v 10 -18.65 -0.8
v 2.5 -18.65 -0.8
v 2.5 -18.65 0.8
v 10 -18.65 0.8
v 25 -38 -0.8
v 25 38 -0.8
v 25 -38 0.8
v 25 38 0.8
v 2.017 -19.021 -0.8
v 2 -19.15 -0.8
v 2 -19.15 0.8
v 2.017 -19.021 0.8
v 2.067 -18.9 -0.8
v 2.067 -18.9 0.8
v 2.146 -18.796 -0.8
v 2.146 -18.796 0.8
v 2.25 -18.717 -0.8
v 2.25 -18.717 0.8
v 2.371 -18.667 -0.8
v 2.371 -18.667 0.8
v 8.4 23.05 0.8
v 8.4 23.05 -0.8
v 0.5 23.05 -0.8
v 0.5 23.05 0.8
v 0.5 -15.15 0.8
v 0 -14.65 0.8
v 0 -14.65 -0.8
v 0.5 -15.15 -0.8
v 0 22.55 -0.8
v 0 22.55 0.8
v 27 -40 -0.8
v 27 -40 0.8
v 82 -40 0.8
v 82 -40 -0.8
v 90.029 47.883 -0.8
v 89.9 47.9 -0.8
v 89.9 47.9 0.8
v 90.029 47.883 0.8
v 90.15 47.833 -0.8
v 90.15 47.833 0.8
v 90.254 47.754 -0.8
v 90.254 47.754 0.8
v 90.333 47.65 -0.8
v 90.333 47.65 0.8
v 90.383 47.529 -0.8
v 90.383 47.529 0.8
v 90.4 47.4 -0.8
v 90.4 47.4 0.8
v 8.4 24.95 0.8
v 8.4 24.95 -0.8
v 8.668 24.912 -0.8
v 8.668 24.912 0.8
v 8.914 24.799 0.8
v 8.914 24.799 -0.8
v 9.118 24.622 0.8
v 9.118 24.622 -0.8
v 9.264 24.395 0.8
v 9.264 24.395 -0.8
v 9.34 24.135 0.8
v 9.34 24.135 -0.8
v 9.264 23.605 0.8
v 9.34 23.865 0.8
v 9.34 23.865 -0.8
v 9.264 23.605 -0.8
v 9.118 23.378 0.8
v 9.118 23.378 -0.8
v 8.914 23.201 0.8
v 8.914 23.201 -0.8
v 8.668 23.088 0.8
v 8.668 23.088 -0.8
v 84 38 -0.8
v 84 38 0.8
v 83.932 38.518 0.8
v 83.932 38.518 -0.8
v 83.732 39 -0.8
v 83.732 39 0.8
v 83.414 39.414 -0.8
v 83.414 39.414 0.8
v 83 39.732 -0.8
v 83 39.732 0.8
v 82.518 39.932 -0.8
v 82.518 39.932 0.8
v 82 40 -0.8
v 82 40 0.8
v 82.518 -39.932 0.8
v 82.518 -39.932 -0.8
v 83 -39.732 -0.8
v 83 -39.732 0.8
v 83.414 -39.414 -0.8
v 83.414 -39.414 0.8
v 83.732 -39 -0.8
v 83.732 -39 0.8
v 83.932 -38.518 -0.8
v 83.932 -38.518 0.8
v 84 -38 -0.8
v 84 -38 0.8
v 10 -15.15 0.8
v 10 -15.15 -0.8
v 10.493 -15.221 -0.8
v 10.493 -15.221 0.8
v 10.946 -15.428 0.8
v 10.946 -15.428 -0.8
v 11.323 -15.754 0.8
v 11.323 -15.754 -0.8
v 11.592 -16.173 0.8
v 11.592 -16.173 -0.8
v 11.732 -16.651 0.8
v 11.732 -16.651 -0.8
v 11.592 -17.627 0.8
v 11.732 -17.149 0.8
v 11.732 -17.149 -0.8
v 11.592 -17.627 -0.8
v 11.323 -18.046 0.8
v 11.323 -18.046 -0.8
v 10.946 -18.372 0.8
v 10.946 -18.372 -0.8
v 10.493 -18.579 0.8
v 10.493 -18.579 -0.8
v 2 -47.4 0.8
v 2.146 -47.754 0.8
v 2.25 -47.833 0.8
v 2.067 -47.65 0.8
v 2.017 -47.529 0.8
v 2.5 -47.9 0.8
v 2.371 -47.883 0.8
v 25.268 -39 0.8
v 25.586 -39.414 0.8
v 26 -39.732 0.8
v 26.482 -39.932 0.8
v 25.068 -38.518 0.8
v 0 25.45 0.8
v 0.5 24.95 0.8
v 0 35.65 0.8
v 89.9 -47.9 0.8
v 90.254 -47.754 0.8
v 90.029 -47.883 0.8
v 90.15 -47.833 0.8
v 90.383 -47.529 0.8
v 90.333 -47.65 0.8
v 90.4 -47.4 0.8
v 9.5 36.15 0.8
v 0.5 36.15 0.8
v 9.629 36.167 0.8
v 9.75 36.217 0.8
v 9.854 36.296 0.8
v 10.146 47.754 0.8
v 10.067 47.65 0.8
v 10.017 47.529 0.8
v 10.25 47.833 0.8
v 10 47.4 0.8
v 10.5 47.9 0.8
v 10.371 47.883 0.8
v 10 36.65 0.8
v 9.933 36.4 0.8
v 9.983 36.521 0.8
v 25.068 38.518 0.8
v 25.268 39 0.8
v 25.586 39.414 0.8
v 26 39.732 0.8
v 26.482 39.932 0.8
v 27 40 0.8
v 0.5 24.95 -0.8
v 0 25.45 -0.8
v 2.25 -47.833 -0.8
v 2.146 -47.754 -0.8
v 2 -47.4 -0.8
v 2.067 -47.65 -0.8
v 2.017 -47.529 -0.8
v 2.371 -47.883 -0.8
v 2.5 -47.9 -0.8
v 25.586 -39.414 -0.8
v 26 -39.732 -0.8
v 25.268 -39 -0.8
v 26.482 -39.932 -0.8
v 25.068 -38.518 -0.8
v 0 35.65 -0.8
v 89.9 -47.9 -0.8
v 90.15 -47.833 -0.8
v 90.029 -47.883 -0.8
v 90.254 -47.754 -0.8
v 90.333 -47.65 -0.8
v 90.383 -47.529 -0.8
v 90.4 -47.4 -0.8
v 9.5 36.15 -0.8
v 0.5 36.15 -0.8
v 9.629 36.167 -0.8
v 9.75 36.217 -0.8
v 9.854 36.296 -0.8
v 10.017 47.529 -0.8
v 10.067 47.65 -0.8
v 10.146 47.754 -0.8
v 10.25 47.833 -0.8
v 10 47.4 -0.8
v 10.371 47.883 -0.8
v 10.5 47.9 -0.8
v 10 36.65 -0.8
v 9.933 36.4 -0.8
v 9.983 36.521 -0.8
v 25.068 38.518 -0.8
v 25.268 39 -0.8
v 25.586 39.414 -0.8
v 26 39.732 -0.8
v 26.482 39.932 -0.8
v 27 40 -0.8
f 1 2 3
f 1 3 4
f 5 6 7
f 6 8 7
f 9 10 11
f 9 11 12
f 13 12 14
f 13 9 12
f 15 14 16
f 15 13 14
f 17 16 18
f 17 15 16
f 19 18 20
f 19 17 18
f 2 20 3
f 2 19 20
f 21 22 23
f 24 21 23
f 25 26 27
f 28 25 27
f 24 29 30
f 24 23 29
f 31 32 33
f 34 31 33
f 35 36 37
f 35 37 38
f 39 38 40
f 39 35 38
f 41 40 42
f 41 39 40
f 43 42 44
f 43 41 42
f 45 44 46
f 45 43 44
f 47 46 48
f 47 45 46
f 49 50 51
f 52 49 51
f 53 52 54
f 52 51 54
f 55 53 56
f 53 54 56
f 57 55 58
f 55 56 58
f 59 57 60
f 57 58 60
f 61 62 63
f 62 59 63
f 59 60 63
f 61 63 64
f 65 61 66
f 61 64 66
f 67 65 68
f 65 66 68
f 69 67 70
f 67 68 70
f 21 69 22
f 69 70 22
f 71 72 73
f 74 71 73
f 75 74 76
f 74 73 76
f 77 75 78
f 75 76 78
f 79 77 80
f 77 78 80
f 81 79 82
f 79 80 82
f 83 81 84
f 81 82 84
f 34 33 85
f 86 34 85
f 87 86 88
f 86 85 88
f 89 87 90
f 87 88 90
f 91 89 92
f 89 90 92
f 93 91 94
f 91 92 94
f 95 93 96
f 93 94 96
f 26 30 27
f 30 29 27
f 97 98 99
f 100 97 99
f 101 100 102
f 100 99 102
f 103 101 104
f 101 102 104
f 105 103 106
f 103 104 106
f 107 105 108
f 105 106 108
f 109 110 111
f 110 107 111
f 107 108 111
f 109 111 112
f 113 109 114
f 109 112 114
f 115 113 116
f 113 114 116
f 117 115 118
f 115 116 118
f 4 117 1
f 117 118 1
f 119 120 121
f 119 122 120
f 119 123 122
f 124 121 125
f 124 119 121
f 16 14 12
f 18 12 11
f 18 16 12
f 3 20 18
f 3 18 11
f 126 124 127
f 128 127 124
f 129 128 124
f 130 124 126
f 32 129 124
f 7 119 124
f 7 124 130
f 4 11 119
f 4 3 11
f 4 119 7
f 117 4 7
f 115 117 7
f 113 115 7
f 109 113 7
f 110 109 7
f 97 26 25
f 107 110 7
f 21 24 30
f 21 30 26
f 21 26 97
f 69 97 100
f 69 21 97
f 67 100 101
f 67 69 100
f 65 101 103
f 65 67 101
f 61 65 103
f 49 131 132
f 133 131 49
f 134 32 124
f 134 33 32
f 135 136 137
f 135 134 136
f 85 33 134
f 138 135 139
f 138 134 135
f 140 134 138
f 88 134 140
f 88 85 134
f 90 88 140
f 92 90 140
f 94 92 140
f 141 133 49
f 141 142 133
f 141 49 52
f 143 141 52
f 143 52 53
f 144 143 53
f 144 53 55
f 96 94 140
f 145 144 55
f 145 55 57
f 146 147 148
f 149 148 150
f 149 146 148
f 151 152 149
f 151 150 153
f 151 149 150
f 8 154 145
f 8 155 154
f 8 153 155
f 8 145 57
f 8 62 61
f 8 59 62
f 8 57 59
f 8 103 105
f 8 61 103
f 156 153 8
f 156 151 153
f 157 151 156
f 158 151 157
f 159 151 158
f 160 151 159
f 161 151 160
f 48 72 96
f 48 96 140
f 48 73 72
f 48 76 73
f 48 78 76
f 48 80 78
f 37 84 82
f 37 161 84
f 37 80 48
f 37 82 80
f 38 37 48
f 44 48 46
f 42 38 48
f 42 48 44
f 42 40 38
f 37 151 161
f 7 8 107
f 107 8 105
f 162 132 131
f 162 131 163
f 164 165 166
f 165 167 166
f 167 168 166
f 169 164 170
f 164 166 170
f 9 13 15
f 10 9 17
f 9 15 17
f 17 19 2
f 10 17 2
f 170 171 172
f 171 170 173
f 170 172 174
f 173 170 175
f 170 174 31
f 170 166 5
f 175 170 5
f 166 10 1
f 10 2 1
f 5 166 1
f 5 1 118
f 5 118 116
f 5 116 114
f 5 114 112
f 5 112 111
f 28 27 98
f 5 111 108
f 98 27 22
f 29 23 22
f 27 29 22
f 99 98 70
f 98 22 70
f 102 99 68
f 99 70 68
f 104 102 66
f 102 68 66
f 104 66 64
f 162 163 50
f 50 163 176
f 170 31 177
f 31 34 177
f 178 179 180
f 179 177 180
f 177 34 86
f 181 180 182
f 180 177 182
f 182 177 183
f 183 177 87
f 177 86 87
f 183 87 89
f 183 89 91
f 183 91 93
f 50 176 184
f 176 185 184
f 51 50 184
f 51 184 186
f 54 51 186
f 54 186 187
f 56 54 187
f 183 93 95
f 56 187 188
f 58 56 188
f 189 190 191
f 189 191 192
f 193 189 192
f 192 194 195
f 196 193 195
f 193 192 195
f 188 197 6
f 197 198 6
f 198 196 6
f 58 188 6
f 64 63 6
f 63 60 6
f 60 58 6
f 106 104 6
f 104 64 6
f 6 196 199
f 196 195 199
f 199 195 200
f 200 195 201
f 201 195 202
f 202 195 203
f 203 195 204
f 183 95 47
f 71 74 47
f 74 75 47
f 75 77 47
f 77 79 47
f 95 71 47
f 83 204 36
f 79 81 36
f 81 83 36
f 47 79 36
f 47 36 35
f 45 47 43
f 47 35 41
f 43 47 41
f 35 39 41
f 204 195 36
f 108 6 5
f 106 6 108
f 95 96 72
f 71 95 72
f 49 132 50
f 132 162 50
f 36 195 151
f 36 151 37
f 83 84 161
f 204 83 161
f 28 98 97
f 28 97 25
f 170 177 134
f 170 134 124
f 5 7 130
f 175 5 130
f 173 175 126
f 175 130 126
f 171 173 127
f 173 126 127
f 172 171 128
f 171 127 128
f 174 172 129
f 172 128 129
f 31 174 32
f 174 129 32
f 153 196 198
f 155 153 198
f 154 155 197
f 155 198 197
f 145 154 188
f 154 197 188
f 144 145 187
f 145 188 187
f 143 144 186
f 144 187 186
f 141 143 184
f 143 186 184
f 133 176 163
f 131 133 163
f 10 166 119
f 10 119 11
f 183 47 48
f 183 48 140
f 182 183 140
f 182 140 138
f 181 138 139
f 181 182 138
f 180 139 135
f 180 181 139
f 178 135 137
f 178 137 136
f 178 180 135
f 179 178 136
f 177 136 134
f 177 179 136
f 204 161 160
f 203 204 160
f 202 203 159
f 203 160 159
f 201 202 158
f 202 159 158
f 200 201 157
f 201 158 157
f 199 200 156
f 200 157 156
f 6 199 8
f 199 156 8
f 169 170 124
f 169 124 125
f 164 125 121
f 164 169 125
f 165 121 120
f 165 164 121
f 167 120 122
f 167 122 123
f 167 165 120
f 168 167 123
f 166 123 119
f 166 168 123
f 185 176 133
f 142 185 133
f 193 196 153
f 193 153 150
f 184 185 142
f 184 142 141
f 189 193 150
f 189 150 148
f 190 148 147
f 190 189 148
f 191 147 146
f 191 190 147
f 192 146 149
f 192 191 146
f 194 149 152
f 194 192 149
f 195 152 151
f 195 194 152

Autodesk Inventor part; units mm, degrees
ref_plane "YZ Plane" through (0, 0, 0) normal (1, 0, 0) x (0, 1, 0)
ref_plane "XZ Plane" through (0, 0, 0) normal (0, 1, 0) x (-1, 0, 0)
ref_plane "XY Plane" through (0, 0, 0) normal (0, 0, 1) x (1, 0, 0)
sketch "Sketch1" plane through (0, 0, 0) normal (0, 0, 1) x (1, 0, 0)
  line L0 (0, 36.15) -> (10, 36.15)
  line L1 (10, 36.15) -> (10, 47.9)
  line L2 (10, 47.9) -> (90.4, 47.9)
  line L3 (90.4, 47.9) -> (90.4, -47.9)
  line L4 (90.4, -47.9) -> (2, -47.9)
  line L5 (10, -15.15) -> (0, -15.15)
  line L6 (-5.5, 48) -> (90.5, 48) construction
  line L7 (90.5, 48) -> (90.5, -48) construction
  line L8 (90.5, -48) -> (-5.5, -48) construction
  line L9 (-5.5, -48) -> (-5.5, 48) construction
  line L10 (-5.4, 47.9) -> (-3.4, 47.9) construction
  line L11 (-3.4, 47.9) -> (-3.4, -47.9) construction
  line L12 (-3.4, -47.9) -> (-5.4, -47.9) construction
  line L13 (-5.4, -47.9) -> (-5.4, 47.9) construction
  line L14 (-3.4, 38.5) -> (7.85, 38.5) construction
  line L15 (7.85, 38.5) -> (7.85, -17.5) construction
  line L16 (7.85, -17.5) -> (-3.4, -17.5) construction
  line L17 (-3.4, -17.5) -> (-3.4, 38.5) construction
  line L18 (2, -47.9) -> (2, -18.65)
  line L19 (2, -18.65) -> (10, -18.65)
  arc A0 (10, -18.65) -> (10, -15.15) centre (10, -16.9) ccw
  line L20 (0, 24) -> (90.5, 24) construction
  circle A1 centre (-2.5, 47.1) radius 0.9 construction
  circle A2 centre (-0.7, 47.1) radius 0.9 construction
  circle A3 centre (1.1, 47.1) radius 0.9 construction
  circle A4 centre (2.9, 47.1) radius 0.9 construction
  circle A5 centre (4.7, 47.1) radius 0.9 construction
  circle A6 centre (6.5, 47.1) radius 0.9 construction
  circle A7 centre (8.3, 47.1) radius 0.9 construction
  circle A8 centre (-2.5, 45.3) radius 0.9 construction
  circle A9 centre (-0.7, 45.3) radius 0.9 construction
  circle A10 centre (1.1, 45.3) radius 0.9 construction
  circle A11 centre (2.9, 45.3) radius 0.9 construction
  circle A12 centre (4.7, 45.3) radius 0.9 construction
  circle A13 centre (6.5, 45.3) radius 0.9 construction
  circle A14 centre (8.3, 45.3) radius 0.9 construction
  circle A15 centre (-2.5, 43.5) radius 0.9 construction
  circle A16 centre (-0.7, 43.5) radius 0.9 construction
  circle A17 centre (1.1, 43.5) radius 0.9 construction
  circle A18 centre (2.9, 43.5) radius 0.9 construction
  circle A19 centre (4.7, 43.5) radius 0.9 construction
  circle A20 centre (6.5, 43.5) radius 0.9 construction
  circle A21 centre (8.3, 43.5) radius 0.9 construction
  circle A22 centre (-2.5, 41.7) radius 0.9 construction
  circle A23 centre (-0.7, 41.7) radius 0.9 construction
  circle A24 centre (1.1, 41.7) radius 0.9 construction
  circle A25 centre (2.9, 41.7) radius 0.9 construction
  circle A26 centre (4.7, 41.7) radius 0.9 construction
  circle A27 centre (6.5, 41.7) radius 0.9 construction
  circle A28 centre (8.3, 41.7) radius 0.9 construction
  circle A29 centre (-2.5, 39.9) radius 0.9 construction
  circle A30 centre (-0.7, 39.9) radius 0.9 construction
  circle A31 centre (1.1, 39.9) radius 0.9 construction
  circle A32 centre (2.9, 39.9) radius 0.9 construction
  circle A33 centre (4.7, 39.9) radius 0.9 construction
  circle A34 centre (6.5, 39.9) radius 0.9 construction
  circle A35 centre (8.3, 39.9) radius 0.9 construction
  line L21 (0, 36.15) -> (0, 24.95)
  line L22 (0, 24.95) -> (8.4, 24.95)
  arc A36 (8.4, 23.05) -> (8.4, 24.95) centre (8.4, 24) ccw
  line L23 (8.4, 23.05) -> (0, 23.05)
  line L24 (0, 23.05) -> (0, -15.15)
  point P0 (0, 0)
  point P1 (-5.5, 0)
  point P2 (90.4, 0)
  point P3 (90.5, 0)
  dimension "d0" = 51.3
  dimension "d1" = 95.8
  dimension "d3" = 10
  dimension "d20" = 96
  dimension "d21" = 96
  dimension "d22" = 0.1
  dimension "d23" = 0.1
  dimension "d24" = 2
  dimension "d25" = 0.1
  dimension "d28" = 11.25
  dimension "d29" = 56
  dimension "d31" = 9.5
  dimension "d32" = 30.5
  dimension "d34" = 3.5
  dimension "d35" = 12.15
  dimension "d36" = 39.15
  dimension "d37" = 14.5
  dimension "d38" = 1.15
  dimension "d39" = 1.8
  dimension "d42" = 1.8
  dimension "d45" = 1.8
  dimension "d48" = 2
  dimension "d49" = 3.4
  dimension "d50" = 1.9
  dimension "d51" = 8.4
  dimension "d52" = 24
extrude "Extrusion1" add sketch "Sketch1" along normal mid plane 1.6
chamfer "Chamfer1" distance 0.5 angle 45 4 edges at (0, 36.15, 0) (0, 24.95, 0) (0, 23.05, 0) (0, -15.15, 0)
fillet "Fillet1" radius 0.5 6 edges at (10, 36.15, 0) (10, 47.9, 0) (90.4, 47.9, 0) (90.4, -47.9, 0) (2, -47.9, 0) (2, -18.65, 0)
sketch "Sketch16" plane through (0, 0, 0.8) normal (0, 0, 1) x (1, 0, 0)
  arc A0 (2.5, -18.65) -> (2, -19.15) centre (2.5, -19.15) ccw projected
  line L0 (2, -19.15) -> (2, -47.4) projected
  arc A1 (2, -47.4) -> (2.5, -47.9) centre (2.5, -47.4) ccw projected
  line L1 (2.5, -47.9) -> (89.9, -47.9) projected
  arc A2 (89.9, -47.9) -> (90.4, -47.4) centre (89.9, -47.4) ccw projected
  line L2 (90.4, -47.4) -> (90.4, 47.4) projected
  arc A3 (90.4, 47.4) -> (89.9, 47.9) centre (89.9, 47.4) ccw projected
  line L3 (89.9, 47.9) -> (10.5, 47.9) projected
  arc A4 (10.5, 47.9) -> (10, 47.4) centre (10.5, 47.4) ccw projected
  line L4 (10, 47.4) -> (10, 36.65) projected
  arc A5 (9.5, 36.15) -> (10, 36.65) centre (9.5, 36.65) ccw projected
  line L5 (9.5, 36.15) -> (0.5, 36.15) projected
  line L6 (0, 35.65) -> (0.5, 36.15) projected
  line L7 (0, 35.65) -> (0, 25.45) projected
  line L8 (0.5, 24.95) -> (0, 25.45) projected
  line L9 (0.5, 24.95) -> (8.4, 24.95) projected
  arc A6 (8.4, 23.05) -> (8.4, 24.95) centre (8.4, 24) ccw projected
  line L10 (8.4, 23.05) -> (0.5, 23.05) projected
  line L11 (0, 22.55) -> (0.5, 23.05) projected
  line L12 (0, 22.55) -> (0, -14.65) projected
  line L13 (0.5, -15.15) -> (0, -14.65) projected
  line L14 (0.5, -15.15) -> (10, -15.15) projected
  arc A7 (10, -18.65) -> (10, -15.15) centre (10, -16.9) ccw projected
  line L15 (10, -18.65) -> (2.5, -18.65) projected
  line L16 (82, 40) -> (27, 40)
  line L17 (25, 38) -> (25, -38)
  line L18 (27, -40) -> (82, -40)
  line L19 (84, -38) -> (84, 38)
  arc A8 (27, 40) -> (25, 38) centre (27, 38) ccw
  arc A9 (84, 38) -> (82, 40) centre (82, 38) ccw
  arc A10 (82, -40) -> (84, -38) centre (82, -38) ccw
  arc A11 (25, -38) -> (27, -40) centre (27, -38) ccw
  point P0 (0, 0)
  point P1 (84, 40)
  point P2 (84, -40)
  point P3 (25, 0)
  dimension "d145" = 80
  dimension "d146" = 25
  dimension "d147" = 84
  dimension "d148" = 2
extrude "Extrusion6" cut sketch "Sketch16" against normal through all contours A9 L19 A10 L18 A11 L17 A8 L16
equation "\"d23\" = d22"
equation "\"d25\" = d22"
equation "\"d42\" = d39"
equation "\"d45\" = d39"
properties part number "Payload-Interposer_PCB" material "Epoxy Resin"
